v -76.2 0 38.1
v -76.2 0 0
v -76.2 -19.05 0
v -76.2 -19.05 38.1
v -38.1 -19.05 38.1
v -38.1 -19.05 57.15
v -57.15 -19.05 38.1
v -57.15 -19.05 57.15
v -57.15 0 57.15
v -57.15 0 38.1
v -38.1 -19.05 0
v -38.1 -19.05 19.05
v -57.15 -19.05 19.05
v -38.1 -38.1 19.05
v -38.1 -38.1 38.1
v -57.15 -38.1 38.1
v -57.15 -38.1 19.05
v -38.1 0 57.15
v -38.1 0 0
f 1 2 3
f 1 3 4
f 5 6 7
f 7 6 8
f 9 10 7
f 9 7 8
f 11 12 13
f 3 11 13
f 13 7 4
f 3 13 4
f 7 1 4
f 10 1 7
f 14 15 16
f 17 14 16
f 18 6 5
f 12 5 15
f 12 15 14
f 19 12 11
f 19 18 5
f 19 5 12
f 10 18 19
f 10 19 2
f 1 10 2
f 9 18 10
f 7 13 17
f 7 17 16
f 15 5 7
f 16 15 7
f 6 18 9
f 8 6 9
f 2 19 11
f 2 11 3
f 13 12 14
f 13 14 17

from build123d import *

# Parameters (mm, degrees)
F0_W     = 19.05
F0_H     = 19.05
F1_DEPTH = 19.05
F2_W     = 19.05
F2_H     = 19.05
F3_DEPTH = 38.1
F4_ANGLE = 180


with BuildPart() as f1:
    # F0 (on Front) → F1 (new body)
    with BuildSketch(Plane.XZ):
        with Locations((-28.575, 47.625)):
            Rectangle(F0_W, F0_H)
        Polygon((-19.05, 38.1), (-38.1, 38.1), (-38.1, 0), (0, 0), (0, 38.1), align=None)
    extrude(amount=-F1_DEPTH)

    # F2 (on Front) → F3 (join)
    with BuildSketch(Plane.XZ):
        with Locations((-28.575, 28.575)):
            Rectangle(F2_W, F2_H)
    extrude(amount=-F3_DEPTH)


with BuildPart() as f1_1:
    # F4: moved
    add(f1.part.rotate(Axis((-38.1, 0, 28.575), (0, 0, -1)), F4_ANGLE))


solid = f1_1.part
